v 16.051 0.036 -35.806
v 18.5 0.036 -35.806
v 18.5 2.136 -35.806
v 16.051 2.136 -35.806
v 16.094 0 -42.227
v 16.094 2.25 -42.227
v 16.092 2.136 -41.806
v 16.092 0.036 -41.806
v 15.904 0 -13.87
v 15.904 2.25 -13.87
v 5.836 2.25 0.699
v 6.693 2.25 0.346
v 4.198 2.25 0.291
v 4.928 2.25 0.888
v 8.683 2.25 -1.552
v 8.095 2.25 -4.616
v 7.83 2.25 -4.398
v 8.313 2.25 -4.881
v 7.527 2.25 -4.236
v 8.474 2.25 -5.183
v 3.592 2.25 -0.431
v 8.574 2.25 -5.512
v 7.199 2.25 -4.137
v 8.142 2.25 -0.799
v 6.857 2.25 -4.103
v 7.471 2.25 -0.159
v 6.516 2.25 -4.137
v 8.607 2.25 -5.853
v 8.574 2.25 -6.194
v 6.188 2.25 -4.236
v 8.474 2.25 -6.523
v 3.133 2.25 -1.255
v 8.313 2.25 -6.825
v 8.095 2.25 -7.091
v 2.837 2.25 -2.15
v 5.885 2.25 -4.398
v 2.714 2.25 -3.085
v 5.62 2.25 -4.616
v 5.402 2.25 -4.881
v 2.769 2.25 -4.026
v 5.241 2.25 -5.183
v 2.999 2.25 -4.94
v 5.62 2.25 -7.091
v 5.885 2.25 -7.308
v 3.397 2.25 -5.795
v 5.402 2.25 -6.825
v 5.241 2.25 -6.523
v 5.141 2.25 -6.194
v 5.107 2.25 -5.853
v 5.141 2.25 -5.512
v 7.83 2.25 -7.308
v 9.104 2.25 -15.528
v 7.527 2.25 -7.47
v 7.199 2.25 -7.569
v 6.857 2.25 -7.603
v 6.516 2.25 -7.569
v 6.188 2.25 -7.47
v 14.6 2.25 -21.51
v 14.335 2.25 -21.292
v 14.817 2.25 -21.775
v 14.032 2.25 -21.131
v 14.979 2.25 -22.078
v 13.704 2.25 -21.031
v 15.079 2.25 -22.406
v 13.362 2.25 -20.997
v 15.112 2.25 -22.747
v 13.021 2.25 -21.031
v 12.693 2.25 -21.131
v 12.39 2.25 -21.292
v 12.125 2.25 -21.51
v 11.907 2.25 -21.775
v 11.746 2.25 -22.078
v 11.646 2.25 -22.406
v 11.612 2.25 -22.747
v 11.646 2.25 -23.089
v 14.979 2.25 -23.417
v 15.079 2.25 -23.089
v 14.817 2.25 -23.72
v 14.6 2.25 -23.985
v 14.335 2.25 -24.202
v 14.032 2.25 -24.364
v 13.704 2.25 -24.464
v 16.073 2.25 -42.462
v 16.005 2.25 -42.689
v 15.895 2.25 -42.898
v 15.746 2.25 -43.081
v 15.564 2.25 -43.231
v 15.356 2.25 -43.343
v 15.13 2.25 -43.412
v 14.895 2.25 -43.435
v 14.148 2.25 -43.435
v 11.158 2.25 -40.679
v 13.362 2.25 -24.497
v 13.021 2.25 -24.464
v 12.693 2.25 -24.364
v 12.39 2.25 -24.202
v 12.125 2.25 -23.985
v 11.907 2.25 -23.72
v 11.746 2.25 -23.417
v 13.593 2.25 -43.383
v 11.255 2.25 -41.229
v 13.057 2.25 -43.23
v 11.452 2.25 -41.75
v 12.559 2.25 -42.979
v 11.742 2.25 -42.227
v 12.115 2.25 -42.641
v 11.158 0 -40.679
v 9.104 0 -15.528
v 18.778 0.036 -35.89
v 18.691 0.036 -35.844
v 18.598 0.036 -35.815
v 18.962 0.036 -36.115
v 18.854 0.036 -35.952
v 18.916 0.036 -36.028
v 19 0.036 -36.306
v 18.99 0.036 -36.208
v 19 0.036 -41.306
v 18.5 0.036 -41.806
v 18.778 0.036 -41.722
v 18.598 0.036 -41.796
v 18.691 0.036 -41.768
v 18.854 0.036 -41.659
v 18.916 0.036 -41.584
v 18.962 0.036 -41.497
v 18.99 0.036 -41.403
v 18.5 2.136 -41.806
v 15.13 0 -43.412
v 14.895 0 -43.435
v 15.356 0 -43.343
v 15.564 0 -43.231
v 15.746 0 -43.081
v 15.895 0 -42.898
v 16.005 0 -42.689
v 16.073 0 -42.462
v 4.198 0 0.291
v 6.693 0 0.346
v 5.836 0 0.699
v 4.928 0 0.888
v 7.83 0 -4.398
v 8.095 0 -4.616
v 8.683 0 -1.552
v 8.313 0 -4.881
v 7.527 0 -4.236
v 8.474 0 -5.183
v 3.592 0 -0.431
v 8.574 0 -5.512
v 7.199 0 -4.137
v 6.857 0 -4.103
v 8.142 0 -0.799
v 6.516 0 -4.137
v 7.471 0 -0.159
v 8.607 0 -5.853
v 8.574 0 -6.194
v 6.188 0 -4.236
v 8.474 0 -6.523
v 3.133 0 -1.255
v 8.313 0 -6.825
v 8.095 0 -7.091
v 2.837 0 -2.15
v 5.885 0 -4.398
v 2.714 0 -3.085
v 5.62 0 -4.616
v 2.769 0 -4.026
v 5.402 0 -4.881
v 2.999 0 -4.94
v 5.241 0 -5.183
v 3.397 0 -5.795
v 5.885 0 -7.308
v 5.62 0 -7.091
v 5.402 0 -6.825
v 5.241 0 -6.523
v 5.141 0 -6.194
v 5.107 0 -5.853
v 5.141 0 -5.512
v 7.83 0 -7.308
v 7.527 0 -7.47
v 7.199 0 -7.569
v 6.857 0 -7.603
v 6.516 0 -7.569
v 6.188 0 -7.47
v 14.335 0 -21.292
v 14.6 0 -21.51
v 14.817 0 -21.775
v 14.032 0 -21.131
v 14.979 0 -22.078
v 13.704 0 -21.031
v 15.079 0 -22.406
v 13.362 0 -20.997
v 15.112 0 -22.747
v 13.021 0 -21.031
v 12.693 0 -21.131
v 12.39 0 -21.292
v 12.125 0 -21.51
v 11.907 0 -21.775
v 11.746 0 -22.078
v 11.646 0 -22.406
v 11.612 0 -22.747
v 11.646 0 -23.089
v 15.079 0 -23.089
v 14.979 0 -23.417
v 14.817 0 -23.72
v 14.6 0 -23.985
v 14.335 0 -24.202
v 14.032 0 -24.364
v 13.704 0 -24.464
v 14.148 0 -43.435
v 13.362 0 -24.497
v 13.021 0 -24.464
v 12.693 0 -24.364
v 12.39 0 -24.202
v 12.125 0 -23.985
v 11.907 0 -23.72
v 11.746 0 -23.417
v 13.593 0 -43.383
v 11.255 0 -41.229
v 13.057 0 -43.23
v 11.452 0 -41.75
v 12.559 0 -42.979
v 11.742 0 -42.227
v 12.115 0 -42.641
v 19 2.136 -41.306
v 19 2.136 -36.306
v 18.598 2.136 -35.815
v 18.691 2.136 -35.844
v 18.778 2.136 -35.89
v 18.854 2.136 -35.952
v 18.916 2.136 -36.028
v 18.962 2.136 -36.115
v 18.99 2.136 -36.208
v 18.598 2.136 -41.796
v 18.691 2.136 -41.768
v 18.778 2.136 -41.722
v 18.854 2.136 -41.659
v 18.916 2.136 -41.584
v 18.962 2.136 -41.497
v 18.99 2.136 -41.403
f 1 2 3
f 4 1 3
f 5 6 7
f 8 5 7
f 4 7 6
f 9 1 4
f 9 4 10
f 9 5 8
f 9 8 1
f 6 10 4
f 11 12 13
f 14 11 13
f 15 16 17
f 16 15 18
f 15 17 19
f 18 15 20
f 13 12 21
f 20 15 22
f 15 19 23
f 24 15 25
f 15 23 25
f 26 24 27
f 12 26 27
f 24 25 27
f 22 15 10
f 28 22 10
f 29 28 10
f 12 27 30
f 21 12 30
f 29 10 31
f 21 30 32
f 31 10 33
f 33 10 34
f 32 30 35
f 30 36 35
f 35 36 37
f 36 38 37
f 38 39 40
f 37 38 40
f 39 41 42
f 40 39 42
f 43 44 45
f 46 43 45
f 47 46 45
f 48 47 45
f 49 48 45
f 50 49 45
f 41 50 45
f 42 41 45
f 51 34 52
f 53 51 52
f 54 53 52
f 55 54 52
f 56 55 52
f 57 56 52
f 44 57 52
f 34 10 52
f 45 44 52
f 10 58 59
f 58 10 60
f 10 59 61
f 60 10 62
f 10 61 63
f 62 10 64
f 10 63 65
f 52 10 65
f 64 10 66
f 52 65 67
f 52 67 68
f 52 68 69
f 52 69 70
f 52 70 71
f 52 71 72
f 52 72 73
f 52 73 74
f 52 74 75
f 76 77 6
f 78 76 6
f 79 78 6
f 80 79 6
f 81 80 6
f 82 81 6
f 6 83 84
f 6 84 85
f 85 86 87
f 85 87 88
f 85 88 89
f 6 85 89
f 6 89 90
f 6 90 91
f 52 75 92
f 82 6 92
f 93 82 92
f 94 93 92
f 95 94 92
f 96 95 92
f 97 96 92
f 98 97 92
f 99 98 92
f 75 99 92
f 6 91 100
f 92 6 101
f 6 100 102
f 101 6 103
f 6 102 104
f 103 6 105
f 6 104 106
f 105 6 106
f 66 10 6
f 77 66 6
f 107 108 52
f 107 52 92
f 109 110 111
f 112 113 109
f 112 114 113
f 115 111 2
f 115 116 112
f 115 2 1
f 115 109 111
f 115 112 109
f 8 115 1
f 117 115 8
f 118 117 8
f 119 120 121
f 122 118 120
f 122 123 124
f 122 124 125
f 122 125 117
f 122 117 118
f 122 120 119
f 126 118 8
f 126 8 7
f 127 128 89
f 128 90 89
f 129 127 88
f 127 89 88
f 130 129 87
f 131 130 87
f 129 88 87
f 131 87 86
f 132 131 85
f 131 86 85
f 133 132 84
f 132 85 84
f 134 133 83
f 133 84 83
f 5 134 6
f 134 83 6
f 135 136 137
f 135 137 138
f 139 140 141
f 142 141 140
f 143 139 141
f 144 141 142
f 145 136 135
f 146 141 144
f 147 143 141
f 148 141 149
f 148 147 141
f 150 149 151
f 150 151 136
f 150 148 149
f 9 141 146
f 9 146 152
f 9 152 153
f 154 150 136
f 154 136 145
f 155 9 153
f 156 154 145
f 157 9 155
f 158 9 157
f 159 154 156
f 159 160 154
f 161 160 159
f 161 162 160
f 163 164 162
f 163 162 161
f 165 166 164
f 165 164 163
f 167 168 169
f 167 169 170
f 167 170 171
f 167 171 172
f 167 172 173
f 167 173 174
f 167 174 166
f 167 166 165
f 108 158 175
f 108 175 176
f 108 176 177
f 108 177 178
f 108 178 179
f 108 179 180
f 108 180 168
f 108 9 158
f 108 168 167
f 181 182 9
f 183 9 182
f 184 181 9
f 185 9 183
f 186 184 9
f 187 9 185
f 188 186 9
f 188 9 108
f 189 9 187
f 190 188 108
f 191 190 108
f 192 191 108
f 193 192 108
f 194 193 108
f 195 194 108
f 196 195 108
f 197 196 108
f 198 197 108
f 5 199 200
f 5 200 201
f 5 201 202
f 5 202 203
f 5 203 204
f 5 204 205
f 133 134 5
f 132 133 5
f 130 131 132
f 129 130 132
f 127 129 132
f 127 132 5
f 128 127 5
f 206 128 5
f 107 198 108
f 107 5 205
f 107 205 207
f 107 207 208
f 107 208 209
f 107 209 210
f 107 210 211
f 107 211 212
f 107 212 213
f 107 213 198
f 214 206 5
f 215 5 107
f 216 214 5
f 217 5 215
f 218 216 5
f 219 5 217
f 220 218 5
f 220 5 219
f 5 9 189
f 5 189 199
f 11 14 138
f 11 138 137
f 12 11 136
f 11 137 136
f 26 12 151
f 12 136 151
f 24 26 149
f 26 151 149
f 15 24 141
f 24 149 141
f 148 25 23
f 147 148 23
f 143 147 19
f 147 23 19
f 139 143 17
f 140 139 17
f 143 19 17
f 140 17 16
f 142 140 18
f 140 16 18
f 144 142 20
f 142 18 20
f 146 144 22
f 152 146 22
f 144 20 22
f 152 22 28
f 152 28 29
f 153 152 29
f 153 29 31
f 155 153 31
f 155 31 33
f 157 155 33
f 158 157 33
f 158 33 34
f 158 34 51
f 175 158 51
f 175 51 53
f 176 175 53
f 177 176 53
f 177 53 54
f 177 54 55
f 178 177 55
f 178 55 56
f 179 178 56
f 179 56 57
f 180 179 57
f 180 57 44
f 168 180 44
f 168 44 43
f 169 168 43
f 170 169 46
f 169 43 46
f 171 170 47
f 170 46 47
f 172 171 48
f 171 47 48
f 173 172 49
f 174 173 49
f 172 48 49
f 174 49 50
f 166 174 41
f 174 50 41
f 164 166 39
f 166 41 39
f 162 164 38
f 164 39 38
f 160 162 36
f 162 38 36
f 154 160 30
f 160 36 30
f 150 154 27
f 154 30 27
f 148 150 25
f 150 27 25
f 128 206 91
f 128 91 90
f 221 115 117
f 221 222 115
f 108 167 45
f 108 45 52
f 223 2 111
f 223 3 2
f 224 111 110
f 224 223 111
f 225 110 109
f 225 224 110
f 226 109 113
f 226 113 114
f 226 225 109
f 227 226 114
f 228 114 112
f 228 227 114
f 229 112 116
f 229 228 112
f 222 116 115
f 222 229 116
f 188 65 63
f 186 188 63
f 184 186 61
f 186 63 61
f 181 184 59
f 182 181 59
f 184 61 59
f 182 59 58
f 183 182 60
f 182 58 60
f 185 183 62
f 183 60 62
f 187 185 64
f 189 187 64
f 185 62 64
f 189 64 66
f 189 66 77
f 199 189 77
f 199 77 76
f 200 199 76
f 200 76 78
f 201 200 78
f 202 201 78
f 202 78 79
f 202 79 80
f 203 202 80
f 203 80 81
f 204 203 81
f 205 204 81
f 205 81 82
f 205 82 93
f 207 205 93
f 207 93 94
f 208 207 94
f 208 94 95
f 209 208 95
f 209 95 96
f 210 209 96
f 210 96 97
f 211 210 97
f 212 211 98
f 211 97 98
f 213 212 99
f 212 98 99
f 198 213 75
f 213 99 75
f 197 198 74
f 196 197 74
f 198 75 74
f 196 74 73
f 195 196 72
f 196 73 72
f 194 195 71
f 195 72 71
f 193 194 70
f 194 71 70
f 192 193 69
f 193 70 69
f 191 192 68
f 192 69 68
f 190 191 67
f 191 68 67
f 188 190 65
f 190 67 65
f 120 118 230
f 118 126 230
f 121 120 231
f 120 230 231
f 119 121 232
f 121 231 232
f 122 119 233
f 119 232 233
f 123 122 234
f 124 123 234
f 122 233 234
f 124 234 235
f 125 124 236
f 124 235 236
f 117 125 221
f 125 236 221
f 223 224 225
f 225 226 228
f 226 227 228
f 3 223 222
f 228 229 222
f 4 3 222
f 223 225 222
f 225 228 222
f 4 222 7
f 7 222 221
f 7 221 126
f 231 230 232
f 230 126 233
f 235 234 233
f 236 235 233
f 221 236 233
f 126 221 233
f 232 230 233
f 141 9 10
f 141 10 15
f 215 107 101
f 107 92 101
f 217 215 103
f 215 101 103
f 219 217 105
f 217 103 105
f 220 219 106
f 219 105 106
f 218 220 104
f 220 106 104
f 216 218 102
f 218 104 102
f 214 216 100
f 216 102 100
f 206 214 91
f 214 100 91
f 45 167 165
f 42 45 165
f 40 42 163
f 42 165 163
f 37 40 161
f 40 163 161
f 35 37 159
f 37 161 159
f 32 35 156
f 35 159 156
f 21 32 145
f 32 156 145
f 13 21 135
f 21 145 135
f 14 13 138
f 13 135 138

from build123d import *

# Parameters (mm, degrees)
BOSS_EXTRUDE1_DEPTH = 2.25
FILLET1_R           = 5
BOSS_EXTRUDE2_REACH = 40.996
SKETCH4_W           = 6
SKETCH4_H           = 2.1
SKETCH4_2_W         = 6
SKETCH4_2_H         = 2.1
BOSS_EXTRUDE3_DEPTH = 2.908330475
FILLET2_R           = 3
FILLET3_R           = 1.2
FILLET4_R           = 0.5
SKETCH2_R           = 1.75
CUT_EXTRUDE1_DEPTH  = 10


with BuildPart() as part:
    # Sketch1 → Boss-Extrude1 (new body)
    with BuildSketch(Plane(origin=(0, 0, 0), x_dir=(1, 0, 0), z_dir=(0, 1, 0))):
        Polygon((0, 0), (9.103642727, 15.528157943), (11.383305122, 43.435202562), (16.102594303, 43.435202562), (15.904357834, 13.869762926), (6.800715107, -1.658395017), align=None)
    extrude(amount=BOSS_EXTRUDE1_DEPTH)

    # Fillet1
    # the kernel refuses this fillet: 5 mm, written as the material it takes off along each edge
    with BuildSketch(Plane(origin=(6.800715107, -9.304114403, 1.658395017), x_dir=(0.5057579292685198, 0, -0.8626754412767405), z_dir=(0, 1, 0))) as fillet1_piece_1:
        with BuildLine():
            CenterArc((FILLET1_R * 0.744329152265, FILLET1_R), FILLET1_R, 196.677230039, 73.322769961)
            Line((-FILLET1_R * 0.213607467111, FILLET1_R * 0.713020151823), (0, 0))
            Line((0, 0), (FILLET1_R * 0.744329152265, 0))
        make_face()
    extrude(amount=20.858228807, mode=Mode.SUBTRACT)
    with BuildSketch(Plane(origin=(0, -16.79364561, 0), x_dir=(0.5057579292685198, 0, -0.8626754412767405), z_dir=(0, 1, 0))) as fillet1_piece_2:
        with BuildLine():
            CenterArc((FILLET1_R * 1.34349164877, -FILLET1_R), FILLET1_R, 90, 106.677230039)
            Line((FILLET1_R * 0.38555502939, -FILLET1_R * 1.28697984818), (0, 0))
            Line((0, 0), (FILLET1_R * 1.34349164877, 0))
        make_face()
    extrude(amount=35.837291219, mode=Mode.SUBTRACT)

    # Boss-Extrude2: up to this plane
    boss_extrude2_end = Plane(origin=(15.904357834, 2.25, -13.869762926), z_dir=(-0.9999775222008104, 0, -0.006704855936389689))
    # Sketch4 → Boss-Extrude2 (add, up to the surface)
    with BuildSketch(Plane(origin=(19, -1.484709168, -8.201879583), x_dir=(0, 0, -1), z_dir=(1, 0, 0)), mode=Mode.PRIVATE) as boss_extrude2_sk1:
        with Locations((30.603976534, 2.57086864)):
            Rectangle(SKETCH4_W, SKETCH4_H)
    boss_extrude2_tool1 = split(extrude(boss_extrude2_sk1.sketch, amount=-BOSS_EXTRUDE2_REACH, mode=Mode.PRIVATE), bisect_by=boss_extrude2_end, keep=Keep.BOTH, mode=Mode.PRIVATE)
    add(boss_extrude2_tool1.solids().sort_by_distance((19, 1.086159, -38.805856))[0])

    # Sketch4<2> → Boss-Extrude3 (add)
    with BuildSketch(Plane(origin=(19, -1.484709168, -8.201879583), x_dir=(0, 0, -1), z_dir=(1, 0, 0))):
        with Locations((30.603976534, 2.57086864)):
            Rectangle(SKETCH4_2_W, SKETCH4_2_H)
    extrude(amount=-BOSS_EXTRUDE3_DEPTH)

    # Fillet2
    fillet2_edges = [part.edges().sort_by_distance(p)[0] for p in [
        (11.383305122, 1.125, -43.435202562),
    ]]
    fillet(fillet2_edges, radius=FILLET2_R)

    # Fillet3
    fillet3_edges = [part.edges().sort_by_distance(p)[0] for p in [
        (16.102594303, 1.125, -43.435202562),
    ]]
    fillet(fillet3_edges, radius=FILLET3_R)

    # Fillet4
    fillet4_edges = [part.edges().sort_by_distance(p)[0] for p in [
        (19, 1.086159472, -41.805856117),
        (19, 1.086159472, -35.805856117),
    ]]
    fillet(fillet4_edges, radius=FILLET4_R)

    # Sketch2 → Cut-Extrude1 (cut)
    with BuildSketch(Plane(origin=(0, 2.25, 0), x_dir=(1, 0, 0), z_dir=(0, 1, 0))):
        with Locations(Location((6.857494693, 5.853068737, 0), (0, 0, 270))):
            Circle(SKETCH2_R)
        with Locations(Location((13.362356268, 22.747397122, 0), (0, 0, 270))):
            Circle(SKETCH2_R)
    extrude(amount=-CUT_EXTRUDE1_DEPTH, mode=Mode.SUBTRACT)


solid = part.part
